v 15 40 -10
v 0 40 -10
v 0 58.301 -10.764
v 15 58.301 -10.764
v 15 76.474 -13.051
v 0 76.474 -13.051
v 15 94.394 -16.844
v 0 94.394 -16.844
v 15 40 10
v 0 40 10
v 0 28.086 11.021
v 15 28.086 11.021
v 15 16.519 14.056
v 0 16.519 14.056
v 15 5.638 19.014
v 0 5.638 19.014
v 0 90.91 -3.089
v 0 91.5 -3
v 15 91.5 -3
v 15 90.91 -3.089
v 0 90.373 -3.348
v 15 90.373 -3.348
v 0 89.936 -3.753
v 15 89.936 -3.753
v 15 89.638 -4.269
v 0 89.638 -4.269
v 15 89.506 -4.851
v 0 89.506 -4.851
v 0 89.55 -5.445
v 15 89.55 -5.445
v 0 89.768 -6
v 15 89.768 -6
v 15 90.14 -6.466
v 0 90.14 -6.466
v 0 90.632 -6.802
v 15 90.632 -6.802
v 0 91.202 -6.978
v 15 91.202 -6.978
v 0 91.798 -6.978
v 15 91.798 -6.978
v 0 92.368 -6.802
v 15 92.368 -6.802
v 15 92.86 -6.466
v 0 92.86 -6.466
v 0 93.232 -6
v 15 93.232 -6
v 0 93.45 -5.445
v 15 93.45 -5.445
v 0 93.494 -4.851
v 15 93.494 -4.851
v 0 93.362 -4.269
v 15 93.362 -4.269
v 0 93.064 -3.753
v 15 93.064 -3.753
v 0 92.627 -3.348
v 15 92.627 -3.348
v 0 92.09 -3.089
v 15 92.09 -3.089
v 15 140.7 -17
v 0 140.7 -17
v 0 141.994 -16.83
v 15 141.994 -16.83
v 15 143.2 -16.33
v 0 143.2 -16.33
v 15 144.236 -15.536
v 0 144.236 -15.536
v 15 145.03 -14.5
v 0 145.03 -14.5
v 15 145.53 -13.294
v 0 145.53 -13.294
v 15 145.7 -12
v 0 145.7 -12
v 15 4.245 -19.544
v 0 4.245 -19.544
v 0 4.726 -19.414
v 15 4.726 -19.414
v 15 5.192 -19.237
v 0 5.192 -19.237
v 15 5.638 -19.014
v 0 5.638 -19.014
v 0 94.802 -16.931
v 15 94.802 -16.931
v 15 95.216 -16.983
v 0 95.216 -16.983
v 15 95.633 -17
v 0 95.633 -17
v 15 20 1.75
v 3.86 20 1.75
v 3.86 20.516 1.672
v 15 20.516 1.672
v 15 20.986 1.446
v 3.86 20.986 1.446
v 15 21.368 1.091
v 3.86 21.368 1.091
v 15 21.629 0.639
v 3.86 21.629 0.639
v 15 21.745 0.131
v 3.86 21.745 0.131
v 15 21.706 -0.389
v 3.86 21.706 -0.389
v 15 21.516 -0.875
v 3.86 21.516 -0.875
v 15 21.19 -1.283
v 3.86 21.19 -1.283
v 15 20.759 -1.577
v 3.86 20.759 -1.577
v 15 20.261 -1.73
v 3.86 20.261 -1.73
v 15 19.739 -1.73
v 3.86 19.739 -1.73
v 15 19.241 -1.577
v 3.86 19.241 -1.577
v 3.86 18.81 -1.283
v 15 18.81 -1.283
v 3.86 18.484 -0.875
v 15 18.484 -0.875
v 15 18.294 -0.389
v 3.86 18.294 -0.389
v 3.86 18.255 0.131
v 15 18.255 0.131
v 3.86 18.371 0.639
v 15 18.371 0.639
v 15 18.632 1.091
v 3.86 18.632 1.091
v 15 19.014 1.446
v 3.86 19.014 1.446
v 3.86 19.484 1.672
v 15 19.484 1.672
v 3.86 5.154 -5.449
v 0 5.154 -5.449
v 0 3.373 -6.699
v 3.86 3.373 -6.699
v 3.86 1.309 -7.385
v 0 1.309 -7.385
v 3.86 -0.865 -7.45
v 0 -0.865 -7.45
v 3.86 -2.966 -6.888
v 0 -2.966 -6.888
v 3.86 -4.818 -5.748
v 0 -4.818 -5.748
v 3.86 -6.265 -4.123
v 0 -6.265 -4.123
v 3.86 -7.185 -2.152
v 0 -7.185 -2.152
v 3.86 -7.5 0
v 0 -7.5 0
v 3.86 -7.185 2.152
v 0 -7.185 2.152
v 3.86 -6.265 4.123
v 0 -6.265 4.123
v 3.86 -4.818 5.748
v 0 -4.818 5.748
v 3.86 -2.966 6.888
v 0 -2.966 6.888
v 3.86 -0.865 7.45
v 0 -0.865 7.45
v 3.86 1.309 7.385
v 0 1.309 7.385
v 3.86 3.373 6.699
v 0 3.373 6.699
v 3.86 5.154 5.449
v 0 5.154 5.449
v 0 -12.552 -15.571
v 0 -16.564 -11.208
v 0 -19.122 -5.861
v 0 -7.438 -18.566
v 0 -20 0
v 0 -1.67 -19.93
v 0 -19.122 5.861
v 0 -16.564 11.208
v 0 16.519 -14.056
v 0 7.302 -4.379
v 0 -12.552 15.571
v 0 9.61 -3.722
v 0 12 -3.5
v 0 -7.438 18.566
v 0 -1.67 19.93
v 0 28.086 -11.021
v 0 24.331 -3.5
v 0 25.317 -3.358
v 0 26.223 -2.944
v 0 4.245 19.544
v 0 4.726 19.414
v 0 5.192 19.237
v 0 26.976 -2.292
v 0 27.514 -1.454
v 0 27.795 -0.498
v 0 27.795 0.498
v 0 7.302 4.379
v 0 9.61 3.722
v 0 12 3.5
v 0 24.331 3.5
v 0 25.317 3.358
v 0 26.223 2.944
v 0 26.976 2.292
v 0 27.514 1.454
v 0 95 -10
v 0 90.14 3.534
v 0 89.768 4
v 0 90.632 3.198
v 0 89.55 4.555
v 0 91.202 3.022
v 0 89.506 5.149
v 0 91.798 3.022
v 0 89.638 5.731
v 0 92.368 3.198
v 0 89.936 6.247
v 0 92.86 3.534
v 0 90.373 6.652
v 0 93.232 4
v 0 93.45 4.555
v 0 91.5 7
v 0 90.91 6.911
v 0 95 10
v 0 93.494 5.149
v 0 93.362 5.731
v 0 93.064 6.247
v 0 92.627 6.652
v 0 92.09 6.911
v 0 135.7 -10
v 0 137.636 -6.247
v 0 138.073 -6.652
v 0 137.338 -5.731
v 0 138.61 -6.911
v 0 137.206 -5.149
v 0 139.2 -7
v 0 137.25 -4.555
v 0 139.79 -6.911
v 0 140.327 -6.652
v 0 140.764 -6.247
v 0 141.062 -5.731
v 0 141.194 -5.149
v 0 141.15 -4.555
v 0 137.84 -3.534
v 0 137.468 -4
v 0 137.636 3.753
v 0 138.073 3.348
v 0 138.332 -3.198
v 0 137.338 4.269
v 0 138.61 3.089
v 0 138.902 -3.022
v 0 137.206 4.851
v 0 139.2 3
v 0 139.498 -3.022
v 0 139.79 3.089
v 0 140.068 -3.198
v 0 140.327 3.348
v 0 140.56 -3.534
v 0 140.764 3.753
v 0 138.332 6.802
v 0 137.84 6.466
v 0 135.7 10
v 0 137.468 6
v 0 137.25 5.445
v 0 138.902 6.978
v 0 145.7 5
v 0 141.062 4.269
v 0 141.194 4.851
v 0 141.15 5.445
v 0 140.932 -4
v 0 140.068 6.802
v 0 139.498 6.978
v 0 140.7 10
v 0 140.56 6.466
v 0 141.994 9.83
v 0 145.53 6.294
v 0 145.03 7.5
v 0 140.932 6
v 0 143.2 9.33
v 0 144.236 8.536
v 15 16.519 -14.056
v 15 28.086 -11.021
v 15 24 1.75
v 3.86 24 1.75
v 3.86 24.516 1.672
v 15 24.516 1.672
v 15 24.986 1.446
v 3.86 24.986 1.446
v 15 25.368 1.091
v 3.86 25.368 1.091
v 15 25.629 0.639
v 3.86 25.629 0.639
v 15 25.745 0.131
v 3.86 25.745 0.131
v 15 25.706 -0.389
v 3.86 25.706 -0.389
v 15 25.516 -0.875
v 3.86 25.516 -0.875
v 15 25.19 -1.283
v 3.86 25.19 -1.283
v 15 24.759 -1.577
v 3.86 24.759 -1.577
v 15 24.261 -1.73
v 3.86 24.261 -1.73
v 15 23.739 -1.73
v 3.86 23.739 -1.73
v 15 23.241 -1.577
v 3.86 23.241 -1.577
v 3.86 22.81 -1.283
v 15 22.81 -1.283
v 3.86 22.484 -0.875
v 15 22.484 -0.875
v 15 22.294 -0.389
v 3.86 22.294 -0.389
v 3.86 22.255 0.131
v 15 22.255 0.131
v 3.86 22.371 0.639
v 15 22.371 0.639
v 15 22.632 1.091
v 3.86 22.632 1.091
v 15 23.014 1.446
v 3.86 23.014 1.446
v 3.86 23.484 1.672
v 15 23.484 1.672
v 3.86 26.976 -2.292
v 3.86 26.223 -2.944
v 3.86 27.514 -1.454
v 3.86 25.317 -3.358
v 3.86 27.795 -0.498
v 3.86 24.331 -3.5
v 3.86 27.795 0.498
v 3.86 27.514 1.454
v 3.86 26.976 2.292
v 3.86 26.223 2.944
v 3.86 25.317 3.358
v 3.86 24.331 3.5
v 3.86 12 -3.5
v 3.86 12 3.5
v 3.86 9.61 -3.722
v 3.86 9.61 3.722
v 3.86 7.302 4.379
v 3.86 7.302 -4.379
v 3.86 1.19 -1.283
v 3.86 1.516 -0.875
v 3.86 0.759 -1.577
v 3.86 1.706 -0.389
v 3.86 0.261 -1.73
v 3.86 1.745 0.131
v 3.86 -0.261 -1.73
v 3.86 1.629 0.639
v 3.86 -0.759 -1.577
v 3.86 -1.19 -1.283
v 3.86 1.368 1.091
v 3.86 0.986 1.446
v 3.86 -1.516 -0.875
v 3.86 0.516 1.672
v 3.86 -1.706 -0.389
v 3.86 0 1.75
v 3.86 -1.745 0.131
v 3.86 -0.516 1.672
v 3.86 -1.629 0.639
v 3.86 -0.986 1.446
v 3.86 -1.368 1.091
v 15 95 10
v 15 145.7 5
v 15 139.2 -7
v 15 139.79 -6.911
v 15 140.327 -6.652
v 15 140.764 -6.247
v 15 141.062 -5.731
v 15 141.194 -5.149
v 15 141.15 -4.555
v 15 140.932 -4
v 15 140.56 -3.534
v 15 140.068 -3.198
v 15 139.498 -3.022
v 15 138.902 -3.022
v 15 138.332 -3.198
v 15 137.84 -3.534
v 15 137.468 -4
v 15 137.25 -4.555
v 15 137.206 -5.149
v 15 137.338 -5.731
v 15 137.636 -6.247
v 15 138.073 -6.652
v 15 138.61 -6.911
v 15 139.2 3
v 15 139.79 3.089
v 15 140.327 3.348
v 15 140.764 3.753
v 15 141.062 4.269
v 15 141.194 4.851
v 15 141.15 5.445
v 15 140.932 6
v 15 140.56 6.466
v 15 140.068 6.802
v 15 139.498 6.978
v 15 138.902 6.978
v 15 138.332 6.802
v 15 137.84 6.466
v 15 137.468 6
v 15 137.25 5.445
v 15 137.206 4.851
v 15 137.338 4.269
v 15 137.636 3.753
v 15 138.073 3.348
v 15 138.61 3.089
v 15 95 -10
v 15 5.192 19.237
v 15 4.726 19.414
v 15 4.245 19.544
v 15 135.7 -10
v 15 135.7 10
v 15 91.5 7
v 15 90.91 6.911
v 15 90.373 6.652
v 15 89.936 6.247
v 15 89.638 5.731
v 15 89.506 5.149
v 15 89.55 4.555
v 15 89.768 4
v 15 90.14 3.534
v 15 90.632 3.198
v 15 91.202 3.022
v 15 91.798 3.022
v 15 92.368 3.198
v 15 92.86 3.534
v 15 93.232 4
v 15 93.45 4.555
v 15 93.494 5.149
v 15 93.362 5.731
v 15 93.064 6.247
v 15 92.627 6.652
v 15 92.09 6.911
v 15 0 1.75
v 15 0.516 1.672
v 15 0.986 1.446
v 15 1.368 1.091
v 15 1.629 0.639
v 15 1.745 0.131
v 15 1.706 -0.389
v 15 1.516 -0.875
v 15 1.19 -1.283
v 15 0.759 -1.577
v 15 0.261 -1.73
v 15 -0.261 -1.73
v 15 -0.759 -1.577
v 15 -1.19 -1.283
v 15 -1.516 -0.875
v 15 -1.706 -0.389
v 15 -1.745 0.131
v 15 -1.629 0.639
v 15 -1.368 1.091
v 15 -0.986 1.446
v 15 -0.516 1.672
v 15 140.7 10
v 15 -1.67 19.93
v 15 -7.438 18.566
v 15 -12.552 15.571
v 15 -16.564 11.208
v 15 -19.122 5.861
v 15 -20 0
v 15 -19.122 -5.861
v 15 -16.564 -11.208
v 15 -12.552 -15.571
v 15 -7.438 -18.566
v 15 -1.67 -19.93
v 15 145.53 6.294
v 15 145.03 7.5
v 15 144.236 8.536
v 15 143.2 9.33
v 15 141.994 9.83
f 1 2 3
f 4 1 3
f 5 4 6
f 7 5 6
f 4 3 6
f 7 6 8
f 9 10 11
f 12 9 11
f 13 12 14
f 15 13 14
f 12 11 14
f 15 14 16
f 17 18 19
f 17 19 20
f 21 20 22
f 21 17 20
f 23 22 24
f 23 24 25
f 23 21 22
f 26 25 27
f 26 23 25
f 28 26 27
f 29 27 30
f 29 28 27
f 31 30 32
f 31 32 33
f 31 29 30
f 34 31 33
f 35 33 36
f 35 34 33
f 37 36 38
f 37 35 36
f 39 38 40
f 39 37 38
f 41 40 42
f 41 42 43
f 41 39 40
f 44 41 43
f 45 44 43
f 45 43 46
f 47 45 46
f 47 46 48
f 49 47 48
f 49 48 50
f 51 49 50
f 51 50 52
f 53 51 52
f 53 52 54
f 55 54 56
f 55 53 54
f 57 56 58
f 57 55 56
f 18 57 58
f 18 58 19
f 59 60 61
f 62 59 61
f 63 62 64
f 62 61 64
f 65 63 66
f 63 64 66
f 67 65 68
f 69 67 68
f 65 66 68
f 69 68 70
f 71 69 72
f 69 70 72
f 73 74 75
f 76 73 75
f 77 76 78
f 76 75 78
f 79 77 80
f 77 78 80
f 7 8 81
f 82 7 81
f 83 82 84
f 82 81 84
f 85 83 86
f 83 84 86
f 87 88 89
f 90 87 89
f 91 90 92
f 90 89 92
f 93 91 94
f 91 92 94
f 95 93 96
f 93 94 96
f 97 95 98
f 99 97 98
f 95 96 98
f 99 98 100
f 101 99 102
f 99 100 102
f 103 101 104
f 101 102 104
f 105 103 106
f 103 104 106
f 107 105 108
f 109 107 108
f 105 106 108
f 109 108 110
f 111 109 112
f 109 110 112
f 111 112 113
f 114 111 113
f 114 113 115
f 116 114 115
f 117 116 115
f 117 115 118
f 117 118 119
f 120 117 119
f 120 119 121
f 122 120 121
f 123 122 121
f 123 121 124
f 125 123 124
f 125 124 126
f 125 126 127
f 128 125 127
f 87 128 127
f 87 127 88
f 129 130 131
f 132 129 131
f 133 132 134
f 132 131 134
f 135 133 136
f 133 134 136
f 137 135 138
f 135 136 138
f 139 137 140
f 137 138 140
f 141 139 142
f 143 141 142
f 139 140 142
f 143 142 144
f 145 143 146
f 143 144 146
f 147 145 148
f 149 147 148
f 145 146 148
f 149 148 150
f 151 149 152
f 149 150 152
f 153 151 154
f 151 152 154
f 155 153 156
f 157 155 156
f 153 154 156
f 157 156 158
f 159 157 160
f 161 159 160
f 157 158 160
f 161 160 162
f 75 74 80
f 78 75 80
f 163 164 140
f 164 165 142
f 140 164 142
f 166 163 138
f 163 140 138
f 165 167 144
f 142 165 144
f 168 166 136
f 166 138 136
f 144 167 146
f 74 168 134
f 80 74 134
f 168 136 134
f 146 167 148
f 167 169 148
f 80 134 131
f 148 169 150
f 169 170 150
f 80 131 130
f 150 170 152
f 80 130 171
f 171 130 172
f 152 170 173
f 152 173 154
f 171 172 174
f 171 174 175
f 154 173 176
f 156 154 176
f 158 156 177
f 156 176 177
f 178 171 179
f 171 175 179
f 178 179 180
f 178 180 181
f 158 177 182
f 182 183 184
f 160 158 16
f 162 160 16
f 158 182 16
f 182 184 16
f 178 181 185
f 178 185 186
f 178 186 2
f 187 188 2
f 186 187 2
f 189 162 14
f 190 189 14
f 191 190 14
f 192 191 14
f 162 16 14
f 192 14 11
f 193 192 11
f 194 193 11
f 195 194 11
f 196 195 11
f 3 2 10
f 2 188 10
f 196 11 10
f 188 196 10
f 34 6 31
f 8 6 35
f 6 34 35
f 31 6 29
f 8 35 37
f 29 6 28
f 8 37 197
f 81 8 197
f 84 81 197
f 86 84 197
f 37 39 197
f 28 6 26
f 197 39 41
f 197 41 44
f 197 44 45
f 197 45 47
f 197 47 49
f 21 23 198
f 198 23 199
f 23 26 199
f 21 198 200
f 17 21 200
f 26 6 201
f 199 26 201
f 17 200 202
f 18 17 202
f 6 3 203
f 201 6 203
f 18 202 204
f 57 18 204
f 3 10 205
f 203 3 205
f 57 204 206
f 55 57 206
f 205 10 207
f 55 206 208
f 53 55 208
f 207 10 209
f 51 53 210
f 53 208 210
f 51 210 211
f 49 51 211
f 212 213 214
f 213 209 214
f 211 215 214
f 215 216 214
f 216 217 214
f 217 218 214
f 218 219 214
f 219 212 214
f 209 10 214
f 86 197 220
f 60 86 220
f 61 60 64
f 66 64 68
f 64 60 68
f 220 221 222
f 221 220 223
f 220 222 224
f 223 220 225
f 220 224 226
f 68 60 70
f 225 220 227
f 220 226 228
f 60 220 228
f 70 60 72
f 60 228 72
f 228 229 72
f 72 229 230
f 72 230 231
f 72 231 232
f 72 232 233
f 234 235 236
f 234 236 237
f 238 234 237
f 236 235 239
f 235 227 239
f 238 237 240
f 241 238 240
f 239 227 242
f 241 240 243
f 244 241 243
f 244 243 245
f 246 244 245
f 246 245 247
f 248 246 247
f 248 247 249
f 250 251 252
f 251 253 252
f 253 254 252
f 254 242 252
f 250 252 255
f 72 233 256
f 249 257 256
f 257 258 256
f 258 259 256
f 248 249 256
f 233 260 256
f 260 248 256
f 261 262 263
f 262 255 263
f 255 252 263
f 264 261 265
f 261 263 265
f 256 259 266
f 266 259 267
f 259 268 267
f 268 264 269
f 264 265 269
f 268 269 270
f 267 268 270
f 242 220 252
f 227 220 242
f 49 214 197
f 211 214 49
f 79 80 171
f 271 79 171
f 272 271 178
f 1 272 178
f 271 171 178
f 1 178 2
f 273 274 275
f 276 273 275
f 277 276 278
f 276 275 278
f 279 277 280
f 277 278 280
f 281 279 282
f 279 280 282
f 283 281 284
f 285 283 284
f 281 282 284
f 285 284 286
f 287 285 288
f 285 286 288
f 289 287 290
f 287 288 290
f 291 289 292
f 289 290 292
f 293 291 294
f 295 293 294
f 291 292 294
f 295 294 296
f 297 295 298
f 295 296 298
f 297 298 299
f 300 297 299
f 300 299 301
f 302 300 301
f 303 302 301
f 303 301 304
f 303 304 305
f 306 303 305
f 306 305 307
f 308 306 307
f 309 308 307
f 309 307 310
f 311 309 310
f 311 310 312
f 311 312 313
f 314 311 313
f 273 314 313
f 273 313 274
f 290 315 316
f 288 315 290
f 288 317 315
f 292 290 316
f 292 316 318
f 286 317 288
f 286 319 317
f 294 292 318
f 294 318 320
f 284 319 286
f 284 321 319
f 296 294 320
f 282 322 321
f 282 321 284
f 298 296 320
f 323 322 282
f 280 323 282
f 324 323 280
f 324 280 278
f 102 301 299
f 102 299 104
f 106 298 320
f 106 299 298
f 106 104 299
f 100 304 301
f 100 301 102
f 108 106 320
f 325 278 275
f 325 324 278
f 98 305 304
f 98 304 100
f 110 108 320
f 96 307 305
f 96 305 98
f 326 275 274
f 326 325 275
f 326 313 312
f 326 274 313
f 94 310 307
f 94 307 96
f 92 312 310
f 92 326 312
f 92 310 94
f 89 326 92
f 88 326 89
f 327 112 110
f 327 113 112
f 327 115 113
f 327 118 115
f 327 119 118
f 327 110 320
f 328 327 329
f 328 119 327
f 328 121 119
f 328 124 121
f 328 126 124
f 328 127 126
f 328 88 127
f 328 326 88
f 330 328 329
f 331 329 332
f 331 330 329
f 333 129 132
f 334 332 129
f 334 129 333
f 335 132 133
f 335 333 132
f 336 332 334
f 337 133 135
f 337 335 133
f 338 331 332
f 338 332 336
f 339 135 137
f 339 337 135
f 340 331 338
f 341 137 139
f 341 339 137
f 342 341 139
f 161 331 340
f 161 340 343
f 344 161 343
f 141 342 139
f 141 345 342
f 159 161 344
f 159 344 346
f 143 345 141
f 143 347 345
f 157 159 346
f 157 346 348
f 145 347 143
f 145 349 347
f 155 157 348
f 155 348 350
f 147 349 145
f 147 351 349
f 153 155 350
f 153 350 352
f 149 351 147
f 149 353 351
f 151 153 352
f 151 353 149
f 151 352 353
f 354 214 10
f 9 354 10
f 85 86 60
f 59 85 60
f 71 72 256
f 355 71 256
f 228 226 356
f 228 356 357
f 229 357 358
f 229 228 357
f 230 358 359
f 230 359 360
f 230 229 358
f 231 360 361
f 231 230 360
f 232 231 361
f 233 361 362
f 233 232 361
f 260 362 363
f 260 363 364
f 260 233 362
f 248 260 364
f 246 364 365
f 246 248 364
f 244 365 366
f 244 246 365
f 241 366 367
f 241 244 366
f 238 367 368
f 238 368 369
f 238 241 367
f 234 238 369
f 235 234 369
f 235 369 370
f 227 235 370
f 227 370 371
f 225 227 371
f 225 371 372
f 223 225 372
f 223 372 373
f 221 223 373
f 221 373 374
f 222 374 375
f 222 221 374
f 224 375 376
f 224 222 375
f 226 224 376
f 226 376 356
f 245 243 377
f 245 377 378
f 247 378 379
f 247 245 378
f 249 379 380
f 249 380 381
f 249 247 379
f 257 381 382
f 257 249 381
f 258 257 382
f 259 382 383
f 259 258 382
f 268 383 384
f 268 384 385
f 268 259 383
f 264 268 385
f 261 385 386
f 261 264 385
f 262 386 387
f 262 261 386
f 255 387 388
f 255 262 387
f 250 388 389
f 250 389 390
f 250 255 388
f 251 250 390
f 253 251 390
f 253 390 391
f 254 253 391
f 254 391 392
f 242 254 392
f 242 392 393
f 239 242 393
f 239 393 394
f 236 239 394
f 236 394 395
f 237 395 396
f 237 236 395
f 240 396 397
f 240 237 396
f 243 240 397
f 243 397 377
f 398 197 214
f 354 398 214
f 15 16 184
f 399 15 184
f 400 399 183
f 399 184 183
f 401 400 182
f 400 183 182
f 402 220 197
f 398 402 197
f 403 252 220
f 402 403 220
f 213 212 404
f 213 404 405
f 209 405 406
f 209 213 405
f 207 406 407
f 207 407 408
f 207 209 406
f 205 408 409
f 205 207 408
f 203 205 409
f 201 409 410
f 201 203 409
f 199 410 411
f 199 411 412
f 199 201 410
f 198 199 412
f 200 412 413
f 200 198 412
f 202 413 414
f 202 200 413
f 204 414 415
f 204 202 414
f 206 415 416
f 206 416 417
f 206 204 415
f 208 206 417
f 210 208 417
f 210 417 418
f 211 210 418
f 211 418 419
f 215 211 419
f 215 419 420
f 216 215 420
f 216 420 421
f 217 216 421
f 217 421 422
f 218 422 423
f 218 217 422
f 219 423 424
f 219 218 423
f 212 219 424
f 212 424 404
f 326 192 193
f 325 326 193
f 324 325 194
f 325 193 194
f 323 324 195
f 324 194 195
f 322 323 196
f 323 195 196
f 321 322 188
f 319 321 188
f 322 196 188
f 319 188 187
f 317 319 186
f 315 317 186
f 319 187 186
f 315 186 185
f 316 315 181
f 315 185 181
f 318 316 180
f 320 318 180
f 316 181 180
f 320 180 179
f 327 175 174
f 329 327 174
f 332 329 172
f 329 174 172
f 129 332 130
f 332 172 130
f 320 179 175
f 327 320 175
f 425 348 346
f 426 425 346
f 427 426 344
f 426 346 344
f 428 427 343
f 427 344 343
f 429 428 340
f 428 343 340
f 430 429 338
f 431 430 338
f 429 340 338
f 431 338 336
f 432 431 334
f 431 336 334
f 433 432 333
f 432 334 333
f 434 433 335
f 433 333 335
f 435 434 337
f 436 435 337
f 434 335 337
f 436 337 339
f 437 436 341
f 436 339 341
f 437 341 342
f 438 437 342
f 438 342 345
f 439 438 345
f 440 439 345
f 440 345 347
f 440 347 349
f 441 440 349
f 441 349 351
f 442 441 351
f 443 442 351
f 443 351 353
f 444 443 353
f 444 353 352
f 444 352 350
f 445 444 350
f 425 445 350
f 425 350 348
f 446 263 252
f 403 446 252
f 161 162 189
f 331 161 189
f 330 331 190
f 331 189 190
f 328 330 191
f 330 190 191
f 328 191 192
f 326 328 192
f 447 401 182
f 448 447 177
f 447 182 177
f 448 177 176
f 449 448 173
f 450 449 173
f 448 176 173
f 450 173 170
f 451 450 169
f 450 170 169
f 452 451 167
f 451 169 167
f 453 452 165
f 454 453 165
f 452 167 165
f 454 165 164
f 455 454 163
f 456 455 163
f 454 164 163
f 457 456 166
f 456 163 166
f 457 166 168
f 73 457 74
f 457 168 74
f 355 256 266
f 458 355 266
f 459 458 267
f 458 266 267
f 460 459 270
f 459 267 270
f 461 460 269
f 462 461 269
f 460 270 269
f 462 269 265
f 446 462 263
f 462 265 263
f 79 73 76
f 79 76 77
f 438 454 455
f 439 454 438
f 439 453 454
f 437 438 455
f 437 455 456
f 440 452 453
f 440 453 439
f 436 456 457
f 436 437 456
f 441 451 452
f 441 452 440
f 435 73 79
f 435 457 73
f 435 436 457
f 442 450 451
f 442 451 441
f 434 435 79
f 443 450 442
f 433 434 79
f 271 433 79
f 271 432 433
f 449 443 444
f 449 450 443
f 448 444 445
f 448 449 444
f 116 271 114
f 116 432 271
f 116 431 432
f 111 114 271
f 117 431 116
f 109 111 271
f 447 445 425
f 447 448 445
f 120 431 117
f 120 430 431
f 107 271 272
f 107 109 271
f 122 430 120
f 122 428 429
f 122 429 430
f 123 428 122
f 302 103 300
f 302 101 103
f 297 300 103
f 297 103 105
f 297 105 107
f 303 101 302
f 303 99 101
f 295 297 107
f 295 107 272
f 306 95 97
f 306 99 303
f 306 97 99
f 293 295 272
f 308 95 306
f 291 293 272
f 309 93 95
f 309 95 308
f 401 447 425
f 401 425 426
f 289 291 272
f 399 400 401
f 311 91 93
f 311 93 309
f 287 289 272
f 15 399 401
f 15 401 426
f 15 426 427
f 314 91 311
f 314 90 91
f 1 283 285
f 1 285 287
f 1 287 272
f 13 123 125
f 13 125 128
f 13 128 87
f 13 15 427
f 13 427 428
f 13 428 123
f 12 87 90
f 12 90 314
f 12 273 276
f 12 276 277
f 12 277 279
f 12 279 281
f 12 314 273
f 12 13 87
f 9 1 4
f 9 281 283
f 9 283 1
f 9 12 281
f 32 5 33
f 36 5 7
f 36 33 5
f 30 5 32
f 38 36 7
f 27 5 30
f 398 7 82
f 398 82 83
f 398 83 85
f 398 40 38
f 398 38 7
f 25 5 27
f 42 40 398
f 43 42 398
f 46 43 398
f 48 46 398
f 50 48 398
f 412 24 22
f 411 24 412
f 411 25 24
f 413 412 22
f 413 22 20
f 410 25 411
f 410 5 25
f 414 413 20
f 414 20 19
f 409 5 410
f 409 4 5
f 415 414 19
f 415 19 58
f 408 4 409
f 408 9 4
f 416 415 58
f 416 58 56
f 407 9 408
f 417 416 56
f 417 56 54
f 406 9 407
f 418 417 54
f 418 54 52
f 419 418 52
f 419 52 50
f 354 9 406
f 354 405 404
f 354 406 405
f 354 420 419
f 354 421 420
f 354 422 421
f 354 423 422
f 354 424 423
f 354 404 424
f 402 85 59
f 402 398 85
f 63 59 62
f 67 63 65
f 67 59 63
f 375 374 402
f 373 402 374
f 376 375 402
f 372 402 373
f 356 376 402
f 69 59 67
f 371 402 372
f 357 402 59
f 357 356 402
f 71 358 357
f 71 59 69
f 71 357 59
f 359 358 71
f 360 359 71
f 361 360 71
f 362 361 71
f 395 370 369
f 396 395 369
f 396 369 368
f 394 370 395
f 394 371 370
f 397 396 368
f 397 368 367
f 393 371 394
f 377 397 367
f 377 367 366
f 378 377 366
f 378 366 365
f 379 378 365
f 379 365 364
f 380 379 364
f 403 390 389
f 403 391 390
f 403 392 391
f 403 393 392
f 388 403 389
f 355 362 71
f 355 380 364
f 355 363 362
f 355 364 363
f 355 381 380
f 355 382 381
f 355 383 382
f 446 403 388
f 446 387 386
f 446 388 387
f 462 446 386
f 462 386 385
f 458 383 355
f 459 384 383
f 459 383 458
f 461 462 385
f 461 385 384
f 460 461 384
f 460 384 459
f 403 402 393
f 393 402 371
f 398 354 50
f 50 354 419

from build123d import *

# Parameters (mm, degrees)
SKETCH1_R           = 2
BOSS_EXTRUDE1_DEPTH = 15
CUT_EXTRUDE1_DEPTH  = 3.86
SKETCH3_R           = 1.75
CUT_EXTRUDE2_DEPTH  = 148.487591342


with BuildPart() as part:
    # Sketch1 → Boss-Extrude1 (new body)
    with BuildSketch(Plane.YZ):
        with BuildLine():
            Line((95, 10), (40, 10))
            ThreePointArc((40, 10), (22.2375432, 12.29110008), (5.637816862, 19.014424902))
            ThreePointArc((5.637816862, 19.014424902), (4.96102116, 19.331638285), (4.24450028, 19.544416527))
            ThreePointArc((4.24450028, 19.544416527), (-20, 0), (4.24450028, -19.544416527))
            ThreePointArc((4.24450028, -19.544416527), (4.96102116, -19.331638285), (5.637816862, -19.014424902))
            ThreePointArc((5.637816862, -19.014424902), (22.2375432, -12.29110008), (40, -10))
            ThreePointArc((40, -10), (67.41148721, -11.71775609), (94.394082105, -16.844147583))
            ThreePointArc((94.394082105, -16.844147583), (95.008519855, -16.960883889), (95.632724183, -17))
            Line((95.632724183, -17), (140.7, -17))
            ThreePointArc((140.7, -17), (144.235533906, -15.535533906), (145.7, -12))
            Line((145.7, -12), (145.7, 5))
            ThreePointArc((145.7, 5), (144.235533906, 8.535533906), (140.7, 10))
            Line((140.7, 10), (135.7, 10))
            Line((135.7, 10), (135.7, -10))
            Line((135.7, -10), (95, -10))
            Line((95, -10), (95, 10))
        make_face()
        with Locations(Location((139.2, -5, 0), (0, 0, 270))):
            Circle(SKETCH1_R, mode=Mode.SUBTRACT)
        with Locations(Location((139.2, 5, 0), (0, 0, 270))):
            Circle(SKETCH1_R, mode=Mode.SUBTRACT)
        with Locations(Location((91.5, -5, 0), (0, 0, 90))):
            Circle(SKETCH1_R, mode=Mode.SUBTRACT)
        with Locations(Location((91.5, 5, 0), (0, 0, 90))):
            Circle(SKETCH1_R, mode=Mode.SUBTRACT)
    extrude(amount=BOSS_EXTRUDE1_DEPTH)

    # Sketch2 → Cut-Extrude1 (cut)
    with BuildSketch(Plane(origin=(0, 0, 0), x_dir=(0, -1, 0), z_dir=(-1, 0, 0))):
        with BuildLine():
            Line((-24.33053856, -3.5), (-12, -3.5))
            ThreePointArc((-12, -3.5), (-8.440790603, -3.996719292), (-5.153570125, -5.448918697))
            ThreePointArc((-5.153570125, -5.448918697), (7.5, 0), (-5.153570125, 5.448918697))
            ThreePointArc((-5.153570125, 5.448918697), (-8.440790603, 3.996719292), (-12, 3.5))
            Line((-12, 3.5), (-24.33053856, 3.5))
            ThreePointArc((-24.33053856, 3.5), (-27.83053856, 0), (-24.33053856, -3.5))
        make_face()
    extrude(amount=-CUT_EXTRUDE1_DEPTH, mode=Mode.SUBTRACT)

    # Sketch3 → Cut-Extrude2 (cut, through all)
    with BuildSketch(Plane(origin=(3.86, 0, 0), x_dir=(0, -1, 0), z_dir=(-1, 0, 0))):
        with Locations(Location((0, 0, 0), (0, 0, 90))):
            Circle(SKETCH3_R)
        with Locations(Location((-20, 0, 0), (0, 0, 90))):
            Circle(SKETCH3_R)
        with Locations(Location((-24, 0, 0), (0, 0, 90))):
            Circle(SKETCH3_R)
    extrude(amount=-CUT_EXTRUDE2_DEPTH, mode=Mode.SUBTRACT)


solid = part.part
